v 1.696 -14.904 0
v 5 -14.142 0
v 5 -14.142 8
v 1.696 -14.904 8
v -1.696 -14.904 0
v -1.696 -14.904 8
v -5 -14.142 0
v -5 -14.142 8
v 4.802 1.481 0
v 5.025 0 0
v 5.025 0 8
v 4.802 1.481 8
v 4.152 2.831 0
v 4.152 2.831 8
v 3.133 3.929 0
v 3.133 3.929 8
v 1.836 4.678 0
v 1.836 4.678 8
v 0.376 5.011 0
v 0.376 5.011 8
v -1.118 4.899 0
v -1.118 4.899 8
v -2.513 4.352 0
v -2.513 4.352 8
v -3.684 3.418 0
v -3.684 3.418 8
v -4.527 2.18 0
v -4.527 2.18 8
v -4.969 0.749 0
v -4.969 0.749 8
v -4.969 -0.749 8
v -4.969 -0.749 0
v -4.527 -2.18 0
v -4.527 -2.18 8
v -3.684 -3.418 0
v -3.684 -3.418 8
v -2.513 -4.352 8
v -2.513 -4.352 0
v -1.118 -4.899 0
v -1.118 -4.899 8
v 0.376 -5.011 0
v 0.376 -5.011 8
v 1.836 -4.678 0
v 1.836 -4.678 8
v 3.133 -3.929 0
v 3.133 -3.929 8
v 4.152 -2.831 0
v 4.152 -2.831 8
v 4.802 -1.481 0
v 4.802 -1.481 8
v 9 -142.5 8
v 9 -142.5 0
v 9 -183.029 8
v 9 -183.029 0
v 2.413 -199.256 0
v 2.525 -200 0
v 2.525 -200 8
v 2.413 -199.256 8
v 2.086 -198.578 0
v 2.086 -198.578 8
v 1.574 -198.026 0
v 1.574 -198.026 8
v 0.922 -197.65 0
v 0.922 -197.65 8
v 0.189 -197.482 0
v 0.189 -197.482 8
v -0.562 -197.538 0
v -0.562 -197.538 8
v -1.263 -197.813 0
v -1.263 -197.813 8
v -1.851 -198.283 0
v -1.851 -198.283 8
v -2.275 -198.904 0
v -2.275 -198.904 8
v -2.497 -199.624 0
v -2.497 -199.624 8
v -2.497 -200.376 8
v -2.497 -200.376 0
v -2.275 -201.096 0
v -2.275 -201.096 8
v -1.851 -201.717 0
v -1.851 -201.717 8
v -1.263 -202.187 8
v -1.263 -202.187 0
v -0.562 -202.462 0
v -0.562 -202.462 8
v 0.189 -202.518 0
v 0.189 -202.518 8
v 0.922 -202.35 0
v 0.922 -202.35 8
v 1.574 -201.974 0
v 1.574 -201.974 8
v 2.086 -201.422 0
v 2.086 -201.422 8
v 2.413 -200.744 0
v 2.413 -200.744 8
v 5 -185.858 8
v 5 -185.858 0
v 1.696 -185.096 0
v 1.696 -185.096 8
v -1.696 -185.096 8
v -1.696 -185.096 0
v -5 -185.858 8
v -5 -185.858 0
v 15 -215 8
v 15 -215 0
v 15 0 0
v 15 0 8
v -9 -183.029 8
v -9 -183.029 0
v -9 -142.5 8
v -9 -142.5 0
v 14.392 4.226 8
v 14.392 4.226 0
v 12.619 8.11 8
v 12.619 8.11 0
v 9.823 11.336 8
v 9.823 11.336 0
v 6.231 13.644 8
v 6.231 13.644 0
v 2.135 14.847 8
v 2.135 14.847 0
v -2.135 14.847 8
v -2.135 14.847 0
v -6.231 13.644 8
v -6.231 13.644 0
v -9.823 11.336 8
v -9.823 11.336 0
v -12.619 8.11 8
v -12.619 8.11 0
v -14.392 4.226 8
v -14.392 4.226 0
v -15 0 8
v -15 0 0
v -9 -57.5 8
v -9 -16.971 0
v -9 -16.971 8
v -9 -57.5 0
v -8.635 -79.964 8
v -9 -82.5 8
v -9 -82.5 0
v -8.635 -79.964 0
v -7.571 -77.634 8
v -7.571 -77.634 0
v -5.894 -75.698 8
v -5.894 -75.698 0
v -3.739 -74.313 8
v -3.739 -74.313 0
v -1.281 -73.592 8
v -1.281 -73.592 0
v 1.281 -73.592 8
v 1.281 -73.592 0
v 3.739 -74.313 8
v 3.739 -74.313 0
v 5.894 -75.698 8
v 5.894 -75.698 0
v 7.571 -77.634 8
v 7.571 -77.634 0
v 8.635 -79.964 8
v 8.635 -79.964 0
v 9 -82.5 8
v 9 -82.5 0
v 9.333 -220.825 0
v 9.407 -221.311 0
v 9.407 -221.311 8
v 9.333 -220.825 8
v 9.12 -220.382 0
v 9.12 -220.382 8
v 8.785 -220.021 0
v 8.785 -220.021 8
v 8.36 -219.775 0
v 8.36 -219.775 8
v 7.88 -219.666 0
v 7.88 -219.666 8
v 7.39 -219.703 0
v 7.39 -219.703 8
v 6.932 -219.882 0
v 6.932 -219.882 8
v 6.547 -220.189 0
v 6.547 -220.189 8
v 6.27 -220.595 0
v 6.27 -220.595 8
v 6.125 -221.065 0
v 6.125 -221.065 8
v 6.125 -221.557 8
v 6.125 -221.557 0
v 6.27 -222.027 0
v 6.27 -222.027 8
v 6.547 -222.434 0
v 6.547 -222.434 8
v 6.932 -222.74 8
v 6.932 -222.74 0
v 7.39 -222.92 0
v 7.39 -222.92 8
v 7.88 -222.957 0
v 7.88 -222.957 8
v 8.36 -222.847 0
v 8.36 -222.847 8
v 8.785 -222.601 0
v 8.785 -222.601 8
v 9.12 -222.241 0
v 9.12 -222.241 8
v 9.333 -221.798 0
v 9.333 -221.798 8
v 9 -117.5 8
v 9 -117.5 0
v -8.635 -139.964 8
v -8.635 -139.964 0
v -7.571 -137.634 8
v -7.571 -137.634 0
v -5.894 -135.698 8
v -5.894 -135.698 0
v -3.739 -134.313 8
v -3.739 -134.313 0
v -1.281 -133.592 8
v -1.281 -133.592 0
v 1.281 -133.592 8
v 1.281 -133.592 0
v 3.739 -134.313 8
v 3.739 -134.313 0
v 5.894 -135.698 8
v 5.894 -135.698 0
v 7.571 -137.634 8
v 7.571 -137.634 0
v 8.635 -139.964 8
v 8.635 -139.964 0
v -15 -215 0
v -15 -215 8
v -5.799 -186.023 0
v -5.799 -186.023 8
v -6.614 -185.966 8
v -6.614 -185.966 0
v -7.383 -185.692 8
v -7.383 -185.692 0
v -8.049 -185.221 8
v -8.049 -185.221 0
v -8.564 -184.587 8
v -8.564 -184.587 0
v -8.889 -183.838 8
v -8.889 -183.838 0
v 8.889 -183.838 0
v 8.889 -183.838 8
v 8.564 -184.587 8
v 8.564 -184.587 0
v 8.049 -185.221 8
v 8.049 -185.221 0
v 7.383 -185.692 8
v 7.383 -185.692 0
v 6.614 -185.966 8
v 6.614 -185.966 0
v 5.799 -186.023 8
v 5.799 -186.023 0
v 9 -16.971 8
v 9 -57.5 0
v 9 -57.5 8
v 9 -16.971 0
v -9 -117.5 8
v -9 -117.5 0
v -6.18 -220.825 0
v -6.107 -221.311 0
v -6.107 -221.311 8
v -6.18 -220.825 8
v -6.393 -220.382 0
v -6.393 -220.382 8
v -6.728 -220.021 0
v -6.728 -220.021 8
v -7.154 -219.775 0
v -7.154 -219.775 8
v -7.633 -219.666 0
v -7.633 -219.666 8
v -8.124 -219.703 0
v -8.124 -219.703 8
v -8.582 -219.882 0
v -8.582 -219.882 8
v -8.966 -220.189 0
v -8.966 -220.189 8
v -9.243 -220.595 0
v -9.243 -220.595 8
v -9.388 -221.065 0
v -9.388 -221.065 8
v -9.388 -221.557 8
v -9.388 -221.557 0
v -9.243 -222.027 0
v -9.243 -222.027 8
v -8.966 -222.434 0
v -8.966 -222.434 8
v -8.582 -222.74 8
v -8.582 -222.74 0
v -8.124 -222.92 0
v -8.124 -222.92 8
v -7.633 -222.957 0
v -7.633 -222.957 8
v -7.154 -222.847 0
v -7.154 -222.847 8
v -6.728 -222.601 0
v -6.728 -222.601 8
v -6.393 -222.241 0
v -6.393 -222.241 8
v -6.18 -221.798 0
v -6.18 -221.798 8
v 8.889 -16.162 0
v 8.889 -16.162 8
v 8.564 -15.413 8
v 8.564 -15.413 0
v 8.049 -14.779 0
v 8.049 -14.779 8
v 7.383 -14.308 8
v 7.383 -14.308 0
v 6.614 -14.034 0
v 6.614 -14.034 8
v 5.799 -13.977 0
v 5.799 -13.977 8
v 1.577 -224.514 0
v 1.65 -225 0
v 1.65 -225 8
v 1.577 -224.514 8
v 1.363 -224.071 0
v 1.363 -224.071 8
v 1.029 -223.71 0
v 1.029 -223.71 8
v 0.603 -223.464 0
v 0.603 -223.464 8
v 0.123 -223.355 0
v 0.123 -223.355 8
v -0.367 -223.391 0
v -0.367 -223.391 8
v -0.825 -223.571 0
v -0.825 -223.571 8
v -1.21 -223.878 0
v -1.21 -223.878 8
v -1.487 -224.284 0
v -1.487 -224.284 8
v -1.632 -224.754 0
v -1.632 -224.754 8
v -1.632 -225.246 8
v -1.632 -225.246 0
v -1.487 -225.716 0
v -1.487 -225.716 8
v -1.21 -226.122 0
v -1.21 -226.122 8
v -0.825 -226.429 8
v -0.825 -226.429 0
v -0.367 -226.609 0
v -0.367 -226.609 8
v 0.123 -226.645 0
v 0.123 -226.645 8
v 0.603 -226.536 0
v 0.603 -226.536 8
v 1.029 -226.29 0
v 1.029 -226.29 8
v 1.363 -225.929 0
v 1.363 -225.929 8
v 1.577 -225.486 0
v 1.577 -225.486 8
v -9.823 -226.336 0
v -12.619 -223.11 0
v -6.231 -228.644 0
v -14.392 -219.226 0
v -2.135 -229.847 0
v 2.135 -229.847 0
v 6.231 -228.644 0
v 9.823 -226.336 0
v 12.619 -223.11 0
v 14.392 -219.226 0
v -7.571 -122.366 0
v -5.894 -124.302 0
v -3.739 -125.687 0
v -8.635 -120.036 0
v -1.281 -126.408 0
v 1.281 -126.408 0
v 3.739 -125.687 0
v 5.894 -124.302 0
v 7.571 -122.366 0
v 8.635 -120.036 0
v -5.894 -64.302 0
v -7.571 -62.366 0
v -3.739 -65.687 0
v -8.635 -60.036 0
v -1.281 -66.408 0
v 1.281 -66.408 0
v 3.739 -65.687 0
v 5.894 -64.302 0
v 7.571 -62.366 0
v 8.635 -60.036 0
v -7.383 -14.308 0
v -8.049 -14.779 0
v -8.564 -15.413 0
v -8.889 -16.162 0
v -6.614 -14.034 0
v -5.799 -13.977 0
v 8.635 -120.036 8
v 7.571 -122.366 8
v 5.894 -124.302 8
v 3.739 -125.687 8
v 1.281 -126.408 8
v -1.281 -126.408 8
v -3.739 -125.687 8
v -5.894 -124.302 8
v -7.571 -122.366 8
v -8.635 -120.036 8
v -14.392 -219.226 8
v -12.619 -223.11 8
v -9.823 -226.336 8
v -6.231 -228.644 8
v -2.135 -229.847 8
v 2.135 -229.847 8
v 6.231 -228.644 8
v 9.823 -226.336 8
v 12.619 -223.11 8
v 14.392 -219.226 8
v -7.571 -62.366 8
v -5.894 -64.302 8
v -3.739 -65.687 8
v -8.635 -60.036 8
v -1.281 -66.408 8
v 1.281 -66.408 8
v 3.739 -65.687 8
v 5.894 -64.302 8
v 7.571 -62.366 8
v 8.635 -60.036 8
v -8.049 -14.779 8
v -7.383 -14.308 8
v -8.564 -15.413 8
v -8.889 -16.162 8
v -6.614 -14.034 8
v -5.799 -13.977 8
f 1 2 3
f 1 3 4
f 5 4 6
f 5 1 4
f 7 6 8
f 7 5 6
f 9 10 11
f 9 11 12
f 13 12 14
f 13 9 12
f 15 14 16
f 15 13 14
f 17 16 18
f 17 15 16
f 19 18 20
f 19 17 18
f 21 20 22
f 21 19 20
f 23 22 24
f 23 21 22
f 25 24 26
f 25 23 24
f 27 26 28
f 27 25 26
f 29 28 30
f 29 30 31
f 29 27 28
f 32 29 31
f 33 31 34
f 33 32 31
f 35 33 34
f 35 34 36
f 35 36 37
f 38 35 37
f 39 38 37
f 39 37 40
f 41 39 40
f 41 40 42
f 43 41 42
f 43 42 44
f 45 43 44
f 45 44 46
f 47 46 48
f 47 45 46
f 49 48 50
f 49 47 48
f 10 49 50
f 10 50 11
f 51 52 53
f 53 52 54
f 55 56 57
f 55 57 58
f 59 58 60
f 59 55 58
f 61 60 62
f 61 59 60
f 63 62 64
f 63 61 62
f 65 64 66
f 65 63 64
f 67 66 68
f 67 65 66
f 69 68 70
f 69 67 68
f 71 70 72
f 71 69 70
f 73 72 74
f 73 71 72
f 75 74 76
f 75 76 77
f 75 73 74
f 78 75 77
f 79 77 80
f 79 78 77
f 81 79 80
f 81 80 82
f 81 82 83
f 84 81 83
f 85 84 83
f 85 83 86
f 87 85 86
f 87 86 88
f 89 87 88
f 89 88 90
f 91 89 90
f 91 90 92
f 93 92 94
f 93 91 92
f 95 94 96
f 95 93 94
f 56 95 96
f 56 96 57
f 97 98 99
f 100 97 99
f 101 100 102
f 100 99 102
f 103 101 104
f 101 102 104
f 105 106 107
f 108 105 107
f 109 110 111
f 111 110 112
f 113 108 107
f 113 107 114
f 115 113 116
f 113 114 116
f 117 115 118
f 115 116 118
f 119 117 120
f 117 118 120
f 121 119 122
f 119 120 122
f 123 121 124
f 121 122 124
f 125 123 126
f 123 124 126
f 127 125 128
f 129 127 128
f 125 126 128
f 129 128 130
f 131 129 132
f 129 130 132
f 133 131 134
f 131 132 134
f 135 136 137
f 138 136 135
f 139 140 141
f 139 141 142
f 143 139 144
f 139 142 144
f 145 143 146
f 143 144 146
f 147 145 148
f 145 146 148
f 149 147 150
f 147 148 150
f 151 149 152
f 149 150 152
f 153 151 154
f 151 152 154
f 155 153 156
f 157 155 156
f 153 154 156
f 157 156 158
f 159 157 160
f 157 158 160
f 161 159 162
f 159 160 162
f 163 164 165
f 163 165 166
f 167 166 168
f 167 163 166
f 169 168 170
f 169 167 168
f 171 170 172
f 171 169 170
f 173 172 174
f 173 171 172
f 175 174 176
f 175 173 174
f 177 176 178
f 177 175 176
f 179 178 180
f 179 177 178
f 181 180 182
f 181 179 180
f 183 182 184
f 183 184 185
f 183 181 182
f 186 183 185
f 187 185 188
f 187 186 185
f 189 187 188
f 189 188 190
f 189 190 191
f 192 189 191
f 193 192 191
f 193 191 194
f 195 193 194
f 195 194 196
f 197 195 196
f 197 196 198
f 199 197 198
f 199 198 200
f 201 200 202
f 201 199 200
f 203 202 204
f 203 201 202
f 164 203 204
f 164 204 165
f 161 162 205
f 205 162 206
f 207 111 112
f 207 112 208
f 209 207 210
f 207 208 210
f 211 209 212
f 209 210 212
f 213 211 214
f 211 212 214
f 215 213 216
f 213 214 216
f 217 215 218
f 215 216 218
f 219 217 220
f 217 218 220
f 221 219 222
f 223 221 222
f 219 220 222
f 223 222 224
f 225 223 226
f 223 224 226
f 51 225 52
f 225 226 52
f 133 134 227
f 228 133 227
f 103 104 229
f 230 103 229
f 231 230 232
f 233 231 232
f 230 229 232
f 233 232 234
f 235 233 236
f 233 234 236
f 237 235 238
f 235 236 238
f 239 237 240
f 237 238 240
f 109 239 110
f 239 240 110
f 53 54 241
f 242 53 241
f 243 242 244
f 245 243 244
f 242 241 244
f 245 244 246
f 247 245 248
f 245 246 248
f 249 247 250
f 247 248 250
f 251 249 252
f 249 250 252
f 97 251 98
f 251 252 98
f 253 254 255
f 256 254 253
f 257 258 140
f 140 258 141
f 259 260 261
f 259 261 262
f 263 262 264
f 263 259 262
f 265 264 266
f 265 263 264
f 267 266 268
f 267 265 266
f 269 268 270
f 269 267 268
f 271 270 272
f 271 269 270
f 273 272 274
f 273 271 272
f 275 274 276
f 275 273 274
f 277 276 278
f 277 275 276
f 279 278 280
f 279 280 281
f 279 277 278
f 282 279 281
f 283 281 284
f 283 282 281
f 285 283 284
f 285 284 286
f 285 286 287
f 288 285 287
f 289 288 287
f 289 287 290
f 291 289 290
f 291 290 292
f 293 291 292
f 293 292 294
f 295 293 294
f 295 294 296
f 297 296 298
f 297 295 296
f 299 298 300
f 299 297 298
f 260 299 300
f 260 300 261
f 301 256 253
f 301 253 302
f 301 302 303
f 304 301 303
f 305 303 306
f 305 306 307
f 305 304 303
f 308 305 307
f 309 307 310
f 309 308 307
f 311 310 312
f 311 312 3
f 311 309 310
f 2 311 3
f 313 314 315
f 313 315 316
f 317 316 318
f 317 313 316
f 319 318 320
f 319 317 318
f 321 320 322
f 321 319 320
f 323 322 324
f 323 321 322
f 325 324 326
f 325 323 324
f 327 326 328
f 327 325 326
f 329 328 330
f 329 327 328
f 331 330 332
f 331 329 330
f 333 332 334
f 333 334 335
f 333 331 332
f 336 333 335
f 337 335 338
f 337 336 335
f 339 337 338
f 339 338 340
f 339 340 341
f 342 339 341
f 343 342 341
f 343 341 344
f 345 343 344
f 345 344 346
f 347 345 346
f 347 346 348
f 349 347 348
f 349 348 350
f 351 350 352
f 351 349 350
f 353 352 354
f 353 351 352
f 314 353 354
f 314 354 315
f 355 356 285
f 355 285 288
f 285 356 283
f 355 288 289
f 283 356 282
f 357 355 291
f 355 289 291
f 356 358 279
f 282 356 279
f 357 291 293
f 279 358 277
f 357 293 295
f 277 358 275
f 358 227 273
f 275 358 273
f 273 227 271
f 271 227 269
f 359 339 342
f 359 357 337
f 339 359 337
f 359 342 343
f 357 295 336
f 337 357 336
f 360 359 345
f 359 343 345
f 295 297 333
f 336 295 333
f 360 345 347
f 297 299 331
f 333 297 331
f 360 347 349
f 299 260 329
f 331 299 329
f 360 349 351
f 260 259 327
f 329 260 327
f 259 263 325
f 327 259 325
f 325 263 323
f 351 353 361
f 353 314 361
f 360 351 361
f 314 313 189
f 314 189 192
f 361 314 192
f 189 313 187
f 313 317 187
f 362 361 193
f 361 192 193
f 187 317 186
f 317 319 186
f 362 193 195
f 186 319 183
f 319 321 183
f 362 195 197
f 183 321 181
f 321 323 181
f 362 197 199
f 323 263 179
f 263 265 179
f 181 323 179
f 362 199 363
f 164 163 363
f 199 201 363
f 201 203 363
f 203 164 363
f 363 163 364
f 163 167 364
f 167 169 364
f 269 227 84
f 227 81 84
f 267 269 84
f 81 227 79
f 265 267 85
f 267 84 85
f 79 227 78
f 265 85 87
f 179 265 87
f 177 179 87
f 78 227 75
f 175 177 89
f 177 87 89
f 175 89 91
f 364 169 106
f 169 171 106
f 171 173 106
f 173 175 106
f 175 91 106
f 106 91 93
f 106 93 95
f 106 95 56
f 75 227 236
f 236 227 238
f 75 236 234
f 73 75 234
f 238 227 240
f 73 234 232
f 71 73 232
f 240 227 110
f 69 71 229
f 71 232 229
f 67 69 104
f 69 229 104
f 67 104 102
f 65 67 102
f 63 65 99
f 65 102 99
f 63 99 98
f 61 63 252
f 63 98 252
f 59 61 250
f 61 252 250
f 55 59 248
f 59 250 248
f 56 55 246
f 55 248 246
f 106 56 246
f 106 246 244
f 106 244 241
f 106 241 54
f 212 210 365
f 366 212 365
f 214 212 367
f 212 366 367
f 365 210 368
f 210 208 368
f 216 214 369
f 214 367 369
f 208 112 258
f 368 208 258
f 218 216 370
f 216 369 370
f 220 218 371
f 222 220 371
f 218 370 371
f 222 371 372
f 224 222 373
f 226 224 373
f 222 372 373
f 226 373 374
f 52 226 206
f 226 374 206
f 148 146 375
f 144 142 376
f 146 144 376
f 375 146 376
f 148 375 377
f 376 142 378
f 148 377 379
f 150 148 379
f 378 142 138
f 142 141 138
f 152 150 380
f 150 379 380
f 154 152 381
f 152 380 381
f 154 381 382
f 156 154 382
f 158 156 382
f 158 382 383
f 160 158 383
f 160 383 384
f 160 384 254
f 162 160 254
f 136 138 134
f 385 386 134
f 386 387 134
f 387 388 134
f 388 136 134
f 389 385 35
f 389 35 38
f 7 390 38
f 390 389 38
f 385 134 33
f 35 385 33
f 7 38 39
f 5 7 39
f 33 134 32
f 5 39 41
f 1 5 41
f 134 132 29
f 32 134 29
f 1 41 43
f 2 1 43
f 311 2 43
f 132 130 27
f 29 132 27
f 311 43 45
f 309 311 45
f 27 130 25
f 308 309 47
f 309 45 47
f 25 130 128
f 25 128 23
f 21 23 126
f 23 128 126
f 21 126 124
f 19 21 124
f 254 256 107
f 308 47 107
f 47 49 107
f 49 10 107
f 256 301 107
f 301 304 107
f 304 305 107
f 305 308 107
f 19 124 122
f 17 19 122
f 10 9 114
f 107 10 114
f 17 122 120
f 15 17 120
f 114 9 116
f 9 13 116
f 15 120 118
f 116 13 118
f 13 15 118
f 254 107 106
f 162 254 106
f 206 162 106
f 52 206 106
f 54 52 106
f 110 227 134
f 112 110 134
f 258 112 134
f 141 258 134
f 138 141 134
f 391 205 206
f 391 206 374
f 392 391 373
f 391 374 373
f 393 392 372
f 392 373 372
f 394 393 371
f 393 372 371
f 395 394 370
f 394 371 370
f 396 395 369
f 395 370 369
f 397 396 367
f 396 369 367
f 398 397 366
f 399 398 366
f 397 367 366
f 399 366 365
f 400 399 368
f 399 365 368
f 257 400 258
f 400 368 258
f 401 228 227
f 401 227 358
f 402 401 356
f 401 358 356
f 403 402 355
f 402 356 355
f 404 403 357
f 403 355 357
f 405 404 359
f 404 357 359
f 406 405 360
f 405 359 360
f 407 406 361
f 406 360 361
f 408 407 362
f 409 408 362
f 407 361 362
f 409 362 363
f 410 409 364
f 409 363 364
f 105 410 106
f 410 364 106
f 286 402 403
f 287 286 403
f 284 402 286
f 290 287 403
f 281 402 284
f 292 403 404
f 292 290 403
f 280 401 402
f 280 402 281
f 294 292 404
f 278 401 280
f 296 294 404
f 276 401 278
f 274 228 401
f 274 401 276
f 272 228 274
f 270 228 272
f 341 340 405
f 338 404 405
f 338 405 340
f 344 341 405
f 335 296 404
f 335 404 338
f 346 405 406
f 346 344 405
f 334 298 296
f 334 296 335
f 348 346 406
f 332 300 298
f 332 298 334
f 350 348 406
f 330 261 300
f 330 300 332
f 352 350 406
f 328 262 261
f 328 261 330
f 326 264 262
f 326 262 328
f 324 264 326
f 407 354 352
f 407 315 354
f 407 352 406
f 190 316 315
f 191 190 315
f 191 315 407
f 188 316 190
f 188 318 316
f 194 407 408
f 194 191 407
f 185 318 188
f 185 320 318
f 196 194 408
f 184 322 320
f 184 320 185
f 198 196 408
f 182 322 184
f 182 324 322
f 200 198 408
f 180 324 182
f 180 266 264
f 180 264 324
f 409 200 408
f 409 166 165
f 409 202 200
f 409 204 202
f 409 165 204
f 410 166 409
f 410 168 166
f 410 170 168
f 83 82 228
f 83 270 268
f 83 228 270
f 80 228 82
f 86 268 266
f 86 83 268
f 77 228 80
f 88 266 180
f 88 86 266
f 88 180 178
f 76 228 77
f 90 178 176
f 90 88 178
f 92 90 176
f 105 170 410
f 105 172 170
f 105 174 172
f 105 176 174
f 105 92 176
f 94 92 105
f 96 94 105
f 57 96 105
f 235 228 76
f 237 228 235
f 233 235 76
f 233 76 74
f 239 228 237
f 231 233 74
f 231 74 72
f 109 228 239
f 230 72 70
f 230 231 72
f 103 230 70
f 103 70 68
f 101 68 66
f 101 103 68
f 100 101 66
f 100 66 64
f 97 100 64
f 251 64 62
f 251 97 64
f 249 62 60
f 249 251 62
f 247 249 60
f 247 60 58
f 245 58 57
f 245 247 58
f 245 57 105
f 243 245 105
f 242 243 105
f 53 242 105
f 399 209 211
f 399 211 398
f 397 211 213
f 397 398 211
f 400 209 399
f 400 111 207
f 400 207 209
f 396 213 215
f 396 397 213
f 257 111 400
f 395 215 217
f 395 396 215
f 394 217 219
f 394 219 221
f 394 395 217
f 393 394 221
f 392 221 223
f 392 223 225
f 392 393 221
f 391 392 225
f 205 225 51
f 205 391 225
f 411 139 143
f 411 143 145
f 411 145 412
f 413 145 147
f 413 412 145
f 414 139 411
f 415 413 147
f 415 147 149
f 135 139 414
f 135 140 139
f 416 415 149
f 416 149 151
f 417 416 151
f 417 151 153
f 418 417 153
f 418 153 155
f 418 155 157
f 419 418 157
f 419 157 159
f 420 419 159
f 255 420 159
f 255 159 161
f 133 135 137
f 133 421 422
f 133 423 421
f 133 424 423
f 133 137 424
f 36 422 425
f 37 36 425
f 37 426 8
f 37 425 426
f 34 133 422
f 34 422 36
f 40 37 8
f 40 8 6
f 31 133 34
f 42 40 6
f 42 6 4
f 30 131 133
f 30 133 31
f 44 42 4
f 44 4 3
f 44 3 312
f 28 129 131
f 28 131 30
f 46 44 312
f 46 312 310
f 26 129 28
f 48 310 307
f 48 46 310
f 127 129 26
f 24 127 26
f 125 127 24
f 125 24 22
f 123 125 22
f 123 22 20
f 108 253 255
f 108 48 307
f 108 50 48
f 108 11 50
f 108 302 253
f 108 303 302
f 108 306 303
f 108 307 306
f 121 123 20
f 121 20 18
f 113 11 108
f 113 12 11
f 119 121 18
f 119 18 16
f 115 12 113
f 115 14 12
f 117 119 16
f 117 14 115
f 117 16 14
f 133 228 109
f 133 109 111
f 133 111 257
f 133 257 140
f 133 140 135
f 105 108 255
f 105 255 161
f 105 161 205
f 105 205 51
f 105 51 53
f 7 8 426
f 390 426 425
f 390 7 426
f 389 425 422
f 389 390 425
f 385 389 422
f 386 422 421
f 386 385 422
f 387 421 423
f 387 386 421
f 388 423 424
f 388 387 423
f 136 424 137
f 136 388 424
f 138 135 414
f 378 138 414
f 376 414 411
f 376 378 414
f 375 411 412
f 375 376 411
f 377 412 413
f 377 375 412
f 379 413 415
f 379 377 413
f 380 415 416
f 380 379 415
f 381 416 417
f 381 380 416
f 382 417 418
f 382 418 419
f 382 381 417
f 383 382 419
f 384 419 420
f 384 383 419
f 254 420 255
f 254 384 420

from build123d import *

# Parameters (mm, degrees)
SKETCH_1_R      = 5.025
SKETCH_1_R_2    = 2.525
EXTRUDE_1_DEPTH = 8
SKETCH_2_R      = 1.65
EXTRUDE_2_DEPTH = 8


with BuildPart() as part:
    # 草图1 → 凸台-拉伸1 (new body)
    with BuildSketch(Plane.XY):
        with BuildLine():
            Line((-15, 0), (-15, -200))
            ThreePointArc((-15, -200), (0, -215), (15, -200))
            Line((15, -200), (15, 0))
            ThreePointArc((15, 0), (0, 15), (-15, 0))
        make_face()
        Circle(SKETCH_1_R, mode=Mode.SUBTRACT)
        with Locations((0, -200)):
            Circle(SKETCH_1_R_2, mode=Mode.SUBTRACT)
        with BuildLine():
            Line((-9, -16.970562748), (-9, -57.5))
            ThreePointArc((-9, -57.5), (0, -66.5), (9, -57.5))
            Line((9, -57.5), (9, -16.970562748))
            ThreePointArc((9, -16.970562748), (7.732050808, -14.521073006), (5, -14.142135624))
            ThreePointArc((5, -14.142135624), (0, -15), (-5, -14.142135624))
            ThreePointArc((-5, -14.142135624), (-7.732050808, -14.521073006), (-9, -16.970562748))
        make_face(mode=Mode.SUBTRACT)
        with BuildLine():
            Line((9, -82.5), (9, -117.5))
            ThreePointArc((9, -117.5), (0, -126.5), (-9, -117.5))
            Line((-9, -117.5), (-9, -82.5))
            ThreePointArc((-9, -82.5), (0, -73.5), (9, -82.5))
        make_face(mode=Mode.SUBTRACT)
        with BuildLine():
            Line((-9, -183.029437252), (-9, -142.5))
            ThreePointArc((-9, -142.5), (0, -133.5), (9, -142.5))
            Line((9, -142.5), (9, -183.029437252))
            ThreePointArc((9, -183.029437252), (7.732050808, -185.478926994), (5, -185.857864376))
            ThreePointArc((5, -185.857864376), (0, -185), (-5, -185.857864376))
            ThreePointArc((-5, -185.857864376), (-7.732050808, -185.478926994), (-9, -183.029437252))
        make_face(mode=Mode.SUBTRACT)
    extrude(amount=EXTRUDE_1_DEPTH)

    # 草图2 → 凸台-拉伸2 (add, through all)
    with BuildSketch(Plane.XY):
        with BuildLine():
            Line((-15, -200), (-15, -215))
            ThreePointArc((-15, -215), (0, -230), (15, -215))
            Line((15, -215), (15, -200))
            ThreePointArc((15, -200), (0, -215), (-15, -200))
        make_face()
        with Locations((0, -225)):
            Circle(SKETCH_2_R, mode=Mode.SUBTRACT)
        with Locations((-7.756707253, -221.311378027)):
            Circle(SKETCH_2_R, mode=Mode.SUBTRACT)
        with Locations((7.756707253, -221.311378027)):
            Circle(SKETCH_2_R, mode=Mode.SUBTRACT)
    extrude(amount=EXTRUDE_2_DEPTH)


solid = part.part
